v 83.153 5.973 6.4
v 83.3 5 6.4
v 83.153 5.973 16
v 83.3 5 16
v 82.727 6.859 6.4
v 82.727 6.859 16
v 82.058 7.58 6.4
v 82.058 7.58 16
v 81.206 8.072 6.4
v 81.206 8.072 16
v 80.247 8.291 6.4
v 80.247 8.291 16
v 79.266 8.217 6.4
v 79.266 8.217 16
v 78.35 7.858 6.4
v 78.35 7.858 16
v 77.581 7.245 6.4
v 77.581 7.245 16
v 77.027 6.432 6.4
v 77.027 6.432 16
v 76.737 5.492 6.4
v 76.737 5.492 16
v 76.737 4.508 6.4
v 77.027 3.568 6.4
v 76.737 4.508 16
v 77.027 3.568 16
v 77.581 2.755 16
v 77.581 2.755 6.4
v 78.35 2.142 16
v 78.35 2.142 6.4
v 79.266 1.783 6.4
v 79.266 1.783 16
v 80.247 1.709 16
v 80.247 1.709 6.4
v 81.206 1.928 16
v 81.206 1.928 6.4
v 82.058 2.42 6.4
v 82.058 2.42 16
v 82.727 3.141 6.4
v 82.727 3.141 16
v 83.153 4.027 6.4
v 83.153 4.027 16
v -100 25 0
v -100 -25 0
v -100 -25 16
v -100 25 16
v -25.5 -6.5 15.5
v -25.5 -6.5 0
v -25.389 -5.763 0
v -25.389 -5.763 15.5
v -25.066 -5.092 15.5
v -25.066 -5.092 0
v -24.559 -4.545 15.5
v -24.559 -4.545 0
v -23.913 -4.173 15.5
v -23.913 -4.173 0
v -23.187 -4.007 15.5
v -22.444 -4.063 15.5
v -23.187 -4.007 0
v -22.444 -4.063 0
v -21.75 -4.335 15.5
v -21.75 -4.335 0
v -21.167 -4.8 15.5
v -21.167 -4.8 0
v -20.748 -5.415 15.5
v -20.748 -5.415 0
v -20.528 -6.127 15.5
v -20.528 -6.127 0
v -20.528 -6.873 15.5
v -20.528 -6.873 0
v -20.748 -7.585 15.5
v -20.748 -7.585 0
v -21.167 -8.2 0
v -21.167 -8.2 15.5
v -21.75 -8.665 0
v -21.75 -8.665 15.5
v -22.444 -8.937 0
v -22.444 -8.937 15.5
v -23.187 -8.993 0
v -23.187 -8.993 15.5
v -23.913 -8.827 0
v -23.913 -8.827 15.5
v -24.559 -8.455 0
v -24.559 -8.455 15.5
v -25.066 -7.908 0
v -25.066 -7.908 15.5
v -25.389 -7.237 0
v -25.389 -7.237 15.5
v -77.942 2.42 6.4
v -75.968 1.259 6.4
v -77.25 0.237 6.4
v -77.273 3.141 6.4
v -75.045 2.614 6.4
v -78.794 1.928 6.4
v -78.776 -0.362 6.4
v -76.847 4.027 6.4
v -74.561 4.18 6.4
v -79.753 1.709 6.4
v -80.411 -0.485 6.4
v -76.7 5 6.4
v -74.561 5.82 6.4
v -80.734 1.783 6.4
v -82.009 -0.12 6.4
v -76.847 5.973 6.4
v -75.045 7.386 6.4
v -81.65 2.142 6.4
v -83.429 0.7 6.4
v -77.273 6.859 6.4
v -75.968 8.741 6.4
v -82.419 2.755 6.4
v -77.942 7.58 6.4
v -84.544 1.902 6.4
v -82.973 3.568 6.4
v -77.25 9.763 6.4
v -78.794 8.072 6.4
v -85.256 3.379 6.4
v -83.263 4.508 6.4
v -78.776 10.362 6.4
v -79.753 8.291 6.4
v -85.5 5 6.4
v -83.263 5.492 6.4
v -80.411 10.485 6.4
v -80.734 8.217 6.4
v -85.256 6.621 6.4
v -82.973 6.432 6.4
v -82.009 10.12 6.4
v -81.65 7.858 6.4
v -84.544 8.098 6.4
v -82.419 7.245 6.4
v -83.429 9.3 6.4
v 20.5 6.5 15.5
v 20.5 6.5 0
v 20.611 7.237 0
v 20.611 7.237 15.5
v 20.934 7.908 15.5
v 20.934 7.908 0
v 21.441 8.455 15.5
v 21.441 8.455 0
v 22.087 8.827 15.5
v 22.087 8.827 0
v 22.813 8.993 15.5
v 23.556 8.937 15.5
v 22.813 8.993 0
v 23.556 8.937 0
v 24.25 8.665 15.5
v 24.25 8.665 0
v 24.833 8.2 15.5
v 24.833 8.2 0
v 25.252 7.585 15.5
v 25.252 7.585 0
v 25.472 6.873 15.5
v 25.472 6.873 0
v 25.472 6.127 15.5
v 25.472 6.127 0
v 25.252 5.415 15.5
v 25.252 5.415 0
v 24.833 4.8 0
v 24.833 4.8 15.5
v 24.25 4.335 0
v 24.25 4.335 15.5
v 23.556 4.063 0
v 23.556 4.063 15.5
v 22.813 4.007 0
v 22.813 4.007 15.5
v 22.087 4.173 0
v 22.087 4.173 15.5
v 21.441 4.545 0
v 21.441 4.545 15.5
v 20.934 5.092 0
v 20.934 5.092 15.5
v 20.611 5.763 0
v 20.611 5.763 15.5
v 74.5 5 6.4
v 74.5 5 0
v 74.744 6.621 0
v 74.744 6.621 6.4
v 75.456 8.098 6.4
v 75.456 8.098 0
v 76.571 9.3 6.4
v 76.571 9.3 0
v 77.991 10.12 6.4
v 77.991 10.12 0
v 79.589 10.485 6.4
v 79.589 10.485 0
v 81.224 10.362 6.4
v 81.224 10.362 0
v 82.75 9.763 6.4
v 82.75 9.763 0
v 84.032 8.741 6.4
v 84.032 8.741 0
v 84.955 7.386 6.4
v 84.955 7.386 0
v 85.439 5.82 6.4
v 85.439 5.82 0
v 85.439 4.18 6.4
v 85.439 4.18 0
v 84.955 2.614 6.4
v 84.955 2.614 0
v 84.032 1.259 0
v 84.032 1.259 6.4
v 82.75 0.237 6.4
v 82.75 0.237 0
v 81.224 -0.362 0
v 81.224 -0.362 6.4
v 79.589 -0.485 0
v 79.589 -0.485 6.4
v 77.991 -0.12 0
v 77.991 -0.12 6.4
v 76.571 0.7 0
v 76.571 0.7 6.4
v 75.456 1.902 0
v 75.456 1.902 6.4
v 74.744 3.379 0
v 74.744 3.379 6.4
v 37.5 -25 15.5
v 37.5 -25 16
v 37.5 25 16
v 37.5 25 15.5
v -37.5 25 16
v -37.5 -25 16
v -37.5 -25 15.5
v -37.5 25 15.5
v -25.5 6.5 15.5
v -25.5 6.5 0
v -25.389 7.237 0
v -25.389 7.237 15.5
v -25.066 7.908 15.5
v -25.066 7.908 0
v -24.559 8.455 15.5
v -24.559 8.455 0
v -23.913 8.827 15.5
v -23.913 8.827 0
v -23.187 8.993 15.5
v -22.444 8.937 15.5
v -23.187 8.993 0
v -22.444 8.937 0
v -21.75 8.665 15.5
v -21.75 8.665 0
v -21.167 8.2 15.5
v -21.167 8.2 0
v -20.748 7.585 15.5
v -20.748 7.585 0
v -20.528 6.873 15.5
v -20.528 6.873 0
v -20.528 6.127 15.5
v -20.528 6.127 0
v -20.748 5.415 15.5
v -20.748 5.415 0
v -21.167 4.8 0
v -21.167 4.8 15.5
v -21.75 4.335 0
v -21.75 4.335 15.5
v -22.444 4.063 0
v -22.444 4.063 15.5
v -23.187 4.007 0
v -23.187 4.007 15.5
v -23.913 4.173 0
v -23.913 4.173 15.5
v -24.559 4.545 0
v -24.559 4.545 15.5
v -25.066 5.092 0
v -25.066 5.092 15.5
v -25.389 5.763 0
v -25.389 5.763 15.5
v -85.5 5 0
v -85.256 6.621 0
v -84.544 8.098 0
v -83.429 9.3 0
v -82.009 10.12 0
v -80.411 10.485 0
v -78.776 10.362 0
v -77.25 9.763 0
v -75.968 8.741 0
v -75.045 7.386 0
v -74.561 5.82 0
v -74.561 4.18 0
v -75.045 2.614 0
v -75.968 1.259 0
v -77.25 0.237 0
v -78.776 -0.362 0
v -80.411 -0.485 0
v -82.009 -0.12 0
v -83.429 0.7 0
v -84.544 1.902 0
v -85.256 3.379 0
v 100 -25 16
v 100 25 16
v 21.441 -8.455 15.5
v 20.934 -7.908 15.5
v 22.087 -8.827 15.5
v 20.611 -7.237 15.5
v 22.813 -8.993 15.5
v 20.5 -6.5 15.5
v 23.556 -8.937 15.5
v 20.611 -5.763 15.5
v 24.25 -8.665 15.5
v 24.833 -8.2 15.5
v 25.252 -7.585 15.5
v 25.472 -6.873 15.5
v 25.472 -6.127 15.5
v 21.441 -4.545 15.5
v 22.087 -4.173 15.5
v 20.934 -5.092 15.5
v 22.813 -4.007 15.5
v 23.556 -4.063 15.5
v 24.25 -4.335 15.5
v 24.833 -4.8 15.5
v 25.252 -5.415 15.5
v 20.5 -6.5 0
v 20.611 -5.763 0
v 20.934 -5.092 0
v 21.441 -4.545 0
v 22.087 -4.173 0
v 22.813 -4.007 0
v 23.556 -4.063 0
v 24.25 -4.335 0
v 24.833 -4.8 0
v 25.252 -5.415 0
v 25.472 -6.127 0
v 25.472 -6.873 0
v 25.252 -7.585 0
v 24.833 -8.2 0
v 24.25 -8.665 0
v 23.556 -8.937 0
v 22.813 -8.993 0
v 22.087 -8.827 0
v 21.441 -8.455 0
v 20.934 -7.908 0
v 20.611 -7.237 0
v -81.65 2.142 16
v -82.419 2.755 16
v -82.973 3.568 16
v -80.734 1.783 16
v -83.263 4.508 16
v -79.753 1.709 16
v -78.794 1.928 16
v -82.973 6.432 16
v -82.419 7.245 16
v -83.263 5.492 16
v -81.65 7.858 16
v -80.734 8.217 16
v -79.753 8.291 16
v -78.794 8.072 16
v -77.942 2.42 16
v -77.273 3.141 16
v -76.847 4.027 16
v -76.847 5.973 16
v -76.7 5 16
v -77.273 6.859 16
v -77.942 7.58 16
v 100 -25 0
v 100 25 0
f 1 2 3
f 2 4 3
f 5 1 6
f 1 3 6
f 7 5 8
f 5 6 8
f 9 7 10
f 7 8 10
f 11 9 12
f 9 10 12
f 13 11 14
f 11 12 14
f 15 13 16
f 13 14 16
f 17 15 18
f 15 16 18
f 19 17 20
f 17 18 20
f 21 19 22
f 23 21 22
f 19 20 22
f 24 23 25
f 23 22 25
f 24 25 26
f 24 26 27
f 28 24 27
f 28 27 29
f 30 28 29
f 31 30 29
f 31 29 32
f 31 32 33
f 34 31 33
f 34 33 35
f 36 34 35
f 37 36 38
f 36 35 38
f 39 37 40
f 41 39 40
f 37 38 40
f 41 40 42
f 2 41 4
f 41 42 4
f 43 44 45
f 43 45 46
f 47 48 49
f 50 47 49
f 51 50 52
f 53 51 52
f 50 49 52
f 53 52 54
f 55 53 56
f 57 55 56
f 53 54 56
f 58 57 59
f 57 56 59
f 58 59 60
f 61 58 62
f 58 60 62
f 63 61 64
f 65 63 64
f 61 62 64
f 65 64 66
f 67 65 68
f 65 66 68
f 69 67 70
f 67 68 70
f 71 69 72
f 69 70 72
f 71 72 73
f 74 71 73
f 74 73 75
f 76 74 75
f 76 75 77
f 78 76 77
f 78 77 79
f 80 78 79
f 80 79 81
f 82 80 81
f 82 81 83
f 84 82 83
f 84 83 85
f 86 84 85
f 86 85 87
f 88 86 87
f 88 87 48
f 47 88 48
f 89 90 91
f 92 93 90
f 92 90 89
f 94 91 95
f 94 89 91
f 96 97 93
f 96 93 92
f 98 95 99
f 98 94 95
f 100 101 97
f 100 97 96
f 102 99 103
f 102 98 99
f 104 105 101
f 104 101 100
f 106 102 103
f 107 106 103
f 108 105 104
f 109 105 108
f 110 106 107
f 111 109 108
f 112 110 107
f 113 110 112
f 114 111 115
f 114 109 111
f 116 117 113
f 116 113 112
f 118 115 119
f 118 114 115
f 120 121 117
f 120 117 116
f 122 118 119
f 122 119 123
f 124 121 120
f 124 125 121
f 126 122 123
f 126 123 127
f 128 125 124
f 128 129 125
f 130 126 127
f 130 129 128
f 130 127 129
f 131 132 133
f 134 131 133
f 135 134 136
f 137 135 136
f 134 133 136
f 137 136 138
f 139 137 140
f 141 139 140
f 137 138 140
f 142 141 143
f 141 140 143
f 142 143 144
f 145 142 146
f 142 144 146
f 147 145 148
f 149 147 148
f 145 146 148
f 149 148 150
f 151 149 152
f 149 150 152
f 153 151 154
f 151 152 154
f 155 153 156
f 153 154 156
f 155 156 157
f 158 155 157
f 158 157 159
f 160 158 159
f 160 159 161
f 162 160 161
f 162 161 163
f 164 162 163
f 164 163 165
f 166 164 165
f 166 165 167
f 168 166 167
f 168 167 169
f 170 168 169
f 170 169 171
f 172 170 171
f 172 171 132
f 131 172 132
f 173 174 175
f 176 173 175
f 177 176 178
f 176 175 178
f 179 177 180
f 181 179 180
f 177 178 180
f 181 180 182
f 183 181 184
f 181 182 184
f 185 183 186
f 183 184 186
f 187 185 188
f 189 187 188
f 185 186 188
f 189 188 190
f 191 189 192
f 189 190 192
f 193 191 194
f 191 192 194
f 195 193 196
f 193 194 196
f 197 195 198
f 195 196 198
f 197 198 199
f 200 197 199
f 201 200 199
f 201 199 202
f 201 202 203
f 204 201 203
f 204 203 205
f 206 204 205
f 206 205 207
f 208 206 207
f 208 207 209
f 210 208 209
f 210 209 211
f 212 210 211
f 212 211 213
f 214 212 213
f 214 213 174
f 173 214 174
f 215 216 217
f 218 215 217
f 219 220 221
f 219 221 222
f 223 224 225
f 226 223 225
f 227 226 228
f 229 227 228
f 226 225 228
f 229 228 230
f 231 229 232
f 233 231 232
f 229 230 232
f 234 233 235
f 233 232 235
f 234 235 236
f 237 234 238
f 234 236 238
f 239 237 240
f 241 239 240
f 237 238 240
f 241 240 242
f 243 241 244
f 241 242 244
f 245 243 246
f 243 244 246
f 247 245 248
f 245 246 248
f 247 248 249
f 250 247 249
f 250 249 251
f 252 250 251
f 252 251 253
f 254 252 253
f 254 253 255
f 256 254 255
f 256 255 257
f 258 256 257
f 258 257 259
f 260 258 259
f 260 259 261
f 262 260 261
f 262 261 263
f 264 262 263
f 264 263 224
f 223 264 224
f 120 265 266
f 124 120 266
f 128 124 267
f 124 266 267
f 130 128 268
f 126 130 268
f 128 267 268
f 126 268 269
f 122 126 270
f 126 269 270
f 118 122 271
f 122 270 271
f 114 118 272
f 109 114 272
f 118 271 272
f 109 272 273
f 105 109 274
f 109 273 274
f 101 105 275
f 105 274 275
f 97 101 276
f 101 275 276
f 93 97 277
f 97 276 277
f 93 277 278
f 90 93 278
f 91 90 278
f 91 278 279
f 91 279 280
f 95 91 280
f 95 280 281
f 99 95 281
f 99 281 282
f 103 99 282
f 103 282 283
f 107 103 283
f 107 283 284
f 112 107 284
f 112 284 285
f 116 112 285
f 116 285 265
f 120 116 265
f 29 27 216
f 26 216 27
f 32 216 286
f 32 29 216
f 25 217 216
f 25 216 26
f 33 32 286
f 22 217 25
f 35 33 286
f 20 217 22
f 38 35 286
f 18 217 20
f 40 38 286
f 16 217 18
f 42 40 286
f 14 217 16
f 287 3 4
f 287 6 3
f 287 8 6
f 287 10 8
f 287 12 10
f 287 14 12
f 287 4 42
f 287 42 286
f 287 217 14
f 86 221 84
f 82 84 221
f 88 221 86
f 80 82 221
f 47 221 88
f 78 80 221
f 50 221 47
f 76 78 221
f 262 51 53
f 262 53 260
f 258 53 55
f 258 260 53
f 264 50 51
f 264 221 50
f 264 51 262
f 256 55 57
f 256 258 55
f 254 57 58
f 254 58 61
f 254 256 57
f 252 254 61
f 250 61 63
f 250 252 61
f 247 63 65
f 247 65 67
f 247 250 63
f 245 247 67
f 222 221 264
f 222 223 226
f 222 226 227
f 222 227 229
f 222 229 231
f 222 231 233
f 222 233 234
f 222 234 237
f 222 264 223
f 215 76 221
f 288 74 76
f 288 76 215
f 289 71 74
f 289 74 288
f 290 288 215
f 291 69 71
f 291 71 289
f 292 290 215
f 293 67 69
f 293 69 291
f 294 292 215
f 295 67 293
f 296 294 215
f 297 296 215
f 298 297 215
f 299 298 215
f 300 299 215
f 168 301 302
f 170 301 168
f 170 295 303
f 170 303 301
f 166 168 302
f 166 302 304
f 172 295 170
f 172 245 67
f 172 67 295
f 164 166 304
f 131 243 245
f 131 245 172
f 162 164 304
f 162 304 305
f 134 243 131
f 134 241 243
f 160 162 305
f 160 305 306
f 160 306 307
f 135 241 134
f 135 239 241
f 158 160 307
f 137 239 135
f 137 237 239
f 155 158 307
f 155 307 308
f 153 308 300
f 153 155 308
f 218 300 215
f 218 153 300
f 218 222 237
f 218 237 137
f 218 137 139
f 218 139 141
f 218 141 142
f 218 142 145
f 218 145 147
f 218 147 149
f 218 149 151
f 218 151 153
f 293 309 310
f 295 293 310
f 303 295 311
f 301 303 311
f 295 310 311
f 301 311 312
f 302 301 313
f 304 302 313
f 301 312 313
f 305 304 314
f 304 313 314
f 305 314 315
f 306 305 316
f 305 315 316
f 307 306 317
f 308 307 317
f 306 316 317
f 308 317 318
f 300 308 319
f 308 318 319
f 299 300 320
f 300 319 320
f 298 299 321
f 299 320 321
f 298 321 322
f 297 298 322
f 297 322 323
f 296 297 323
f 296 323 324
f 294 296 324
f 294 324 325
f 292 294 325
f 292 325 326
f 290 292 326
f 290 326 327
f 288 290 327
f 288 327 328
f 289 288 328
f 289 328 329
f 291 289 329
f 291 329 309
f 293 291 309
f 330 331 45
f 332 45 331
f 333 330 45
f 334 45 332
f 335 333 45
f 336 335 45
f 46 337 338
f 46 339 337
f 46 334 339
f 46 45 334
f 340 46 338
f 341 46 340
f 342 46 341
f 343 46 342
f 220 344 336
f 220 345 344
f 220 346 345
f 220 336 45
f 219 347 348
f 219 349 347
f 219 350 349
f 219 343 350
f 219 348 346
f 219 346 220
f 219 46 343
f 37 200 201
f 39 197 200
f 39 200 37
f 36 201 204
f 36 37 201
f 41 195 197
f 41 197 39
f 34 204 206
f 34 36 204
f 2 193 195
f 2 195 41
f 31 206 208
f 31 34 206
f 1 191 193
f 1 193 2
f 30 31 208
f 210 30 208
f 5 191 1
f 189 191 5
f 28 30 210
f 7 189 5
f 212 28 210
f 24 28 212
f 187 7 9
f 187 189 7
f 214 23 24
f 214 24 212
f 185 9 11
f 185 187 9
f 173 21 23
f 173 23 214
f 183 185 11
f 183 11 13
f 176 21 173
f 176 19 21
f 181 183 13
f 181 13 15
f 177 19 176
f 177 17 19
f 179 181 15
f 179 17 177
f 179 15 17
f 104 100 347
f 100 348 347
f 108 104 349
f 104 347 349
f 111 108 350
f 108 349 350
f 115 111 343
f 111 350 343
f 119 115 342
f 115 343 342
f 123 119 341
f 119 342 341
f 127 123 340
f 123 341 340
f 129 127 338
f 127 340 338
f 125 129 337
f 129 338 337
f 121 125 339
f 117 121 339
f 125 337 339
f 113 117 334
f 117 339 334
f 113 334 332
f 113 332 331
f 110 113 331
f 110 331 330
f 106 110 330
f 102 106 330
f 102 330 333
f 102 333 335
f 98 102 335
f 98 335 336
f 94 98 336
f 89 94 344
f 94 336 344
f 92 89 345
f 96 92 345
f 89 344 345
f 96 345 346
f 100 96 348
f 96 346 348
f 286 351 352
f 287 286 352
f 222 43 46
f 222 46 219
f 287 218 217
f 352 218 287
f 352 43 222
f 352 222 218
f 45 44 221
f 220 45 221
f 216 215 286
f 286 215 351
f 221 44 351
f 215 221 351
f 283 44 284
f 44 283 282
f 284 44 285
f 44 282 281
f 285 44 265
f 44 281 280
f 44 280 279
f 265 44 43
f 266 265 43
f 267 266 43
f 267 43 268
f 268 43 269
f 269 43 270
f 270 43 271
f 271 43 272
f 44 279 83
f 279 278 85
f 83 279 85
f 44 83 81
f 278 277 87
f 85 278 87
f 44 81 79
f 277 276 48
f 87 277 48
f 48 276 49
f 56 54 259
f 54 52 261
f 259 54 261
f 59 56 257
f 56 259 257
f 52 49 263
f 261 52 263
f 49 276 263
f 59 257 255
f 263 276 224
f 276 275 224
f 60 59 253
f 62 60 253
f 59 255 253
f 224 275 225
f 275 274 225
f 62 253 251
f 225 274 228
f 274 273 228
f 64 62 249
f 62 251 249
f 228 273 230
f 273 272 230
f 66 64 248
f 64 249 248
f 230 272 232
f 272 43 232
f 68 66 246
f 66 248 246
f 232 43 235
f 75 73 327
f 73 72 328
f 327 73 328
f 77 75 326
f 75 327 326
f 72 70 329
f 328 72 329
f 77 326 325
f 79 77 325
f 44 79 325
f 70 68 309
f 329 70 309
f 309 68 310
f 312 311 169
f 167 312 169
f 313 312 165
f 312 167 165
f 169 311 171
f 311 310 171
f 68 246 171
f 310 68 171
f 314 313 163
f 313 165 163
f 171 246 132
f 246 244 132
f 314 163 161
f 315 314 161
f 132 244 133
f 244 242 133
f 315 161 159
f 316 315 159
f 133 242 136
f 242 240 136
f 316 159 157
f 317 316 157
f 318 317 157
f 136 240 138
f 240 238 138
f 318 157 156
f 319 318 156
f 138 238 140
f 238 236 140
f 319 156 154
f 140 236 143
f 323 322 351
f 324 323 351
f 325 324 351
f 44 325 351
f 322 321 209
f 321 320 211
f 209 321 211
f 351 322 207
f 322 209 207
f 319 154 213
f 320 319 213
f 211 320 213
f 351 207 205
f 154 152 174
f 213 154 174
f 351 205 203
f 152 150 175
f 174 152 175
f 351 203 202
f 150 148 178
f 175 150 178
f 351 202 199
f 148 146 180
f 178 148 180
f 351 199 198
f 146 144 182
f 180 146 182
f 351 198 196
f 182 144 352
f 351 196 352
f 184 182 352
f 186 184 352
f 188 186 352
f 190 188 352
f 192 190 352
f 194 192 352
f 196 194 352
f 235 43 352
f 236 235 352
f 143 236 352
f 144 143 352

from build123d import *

# Parameters (mm, degrees)
SKETCH1_W                                           = 200
SKETCH1_H                                           = 50
EXTRUDE1_DEPTH                                      = 16
SKETCH2_W                                           = 75
SKETCH2_H                                           = 50
EXTRUDE2_DEPTH                                      = 0.5
M6_TAPPED_HOLE1_D                                   = 5
CBORE_FOR_M6_HEX_SOCKET_HEAD_CAP_SCREW1_D           = 6.6
CBORE_FOR_M6_HEX_SOCKET_HEAD_CAP_SCREW1_CBORE_D     = 11
CBORE_FOR_M6_HEX_SOCKET_HEAD_CAP_SCREW1_CBORE_DEPTH = 6.4


with BuildPart() as part:
    # Sketch1 → Extrude1 (new body)
    with BuildSketch(Plane.XY):
        Rectangle(SKETCH1_W, SKETCH1_H)
    extrude(amount=EXTRUDE1_DEPTH)

    # Sketch2 → Extrude2 (cut)
    with BuildSketch(Plane.XY.offset(16)):
        Rectangle(SKETCH2_W, SKETCH2_H)
    extrude(amount=-EXTRUDE2_DEPTH, mode=Mode.SUBTRACT)

    # M6 Tapped Hole1 (through all)
    with Locations(Plane.XY.offset(15.5)):
        with Locations((-23, 6.5), (-23, -6.5), (23, -6.5), (23, 6.5)):
            Hole(M6_TAPPED_HOLE1_D / 2)

    # CBORE for M6 Hex Socket Head Cap Screw1 (through all)
    with Locations(Plane(origin=(0, 0, 0), x_dir=(-1, 0, 0), z_dir=(0, 0, -1))):
        with Locations((-80, 5), (80, 5)):
            CounterBoreHole(CBORE_FOR_M6_HEX_SOCKET_HEAD_CAP_SCREW1_D / 2, CBORE_FOR_M6_HEX_SOCKET_HEAD_CAP_SCREW1_CBORE_D / 2, CBORE_FOR_M6_HEX_SOCKET_HEAD_CAP_SCREW1_CBORE_DEPTH)


solid = part.part
